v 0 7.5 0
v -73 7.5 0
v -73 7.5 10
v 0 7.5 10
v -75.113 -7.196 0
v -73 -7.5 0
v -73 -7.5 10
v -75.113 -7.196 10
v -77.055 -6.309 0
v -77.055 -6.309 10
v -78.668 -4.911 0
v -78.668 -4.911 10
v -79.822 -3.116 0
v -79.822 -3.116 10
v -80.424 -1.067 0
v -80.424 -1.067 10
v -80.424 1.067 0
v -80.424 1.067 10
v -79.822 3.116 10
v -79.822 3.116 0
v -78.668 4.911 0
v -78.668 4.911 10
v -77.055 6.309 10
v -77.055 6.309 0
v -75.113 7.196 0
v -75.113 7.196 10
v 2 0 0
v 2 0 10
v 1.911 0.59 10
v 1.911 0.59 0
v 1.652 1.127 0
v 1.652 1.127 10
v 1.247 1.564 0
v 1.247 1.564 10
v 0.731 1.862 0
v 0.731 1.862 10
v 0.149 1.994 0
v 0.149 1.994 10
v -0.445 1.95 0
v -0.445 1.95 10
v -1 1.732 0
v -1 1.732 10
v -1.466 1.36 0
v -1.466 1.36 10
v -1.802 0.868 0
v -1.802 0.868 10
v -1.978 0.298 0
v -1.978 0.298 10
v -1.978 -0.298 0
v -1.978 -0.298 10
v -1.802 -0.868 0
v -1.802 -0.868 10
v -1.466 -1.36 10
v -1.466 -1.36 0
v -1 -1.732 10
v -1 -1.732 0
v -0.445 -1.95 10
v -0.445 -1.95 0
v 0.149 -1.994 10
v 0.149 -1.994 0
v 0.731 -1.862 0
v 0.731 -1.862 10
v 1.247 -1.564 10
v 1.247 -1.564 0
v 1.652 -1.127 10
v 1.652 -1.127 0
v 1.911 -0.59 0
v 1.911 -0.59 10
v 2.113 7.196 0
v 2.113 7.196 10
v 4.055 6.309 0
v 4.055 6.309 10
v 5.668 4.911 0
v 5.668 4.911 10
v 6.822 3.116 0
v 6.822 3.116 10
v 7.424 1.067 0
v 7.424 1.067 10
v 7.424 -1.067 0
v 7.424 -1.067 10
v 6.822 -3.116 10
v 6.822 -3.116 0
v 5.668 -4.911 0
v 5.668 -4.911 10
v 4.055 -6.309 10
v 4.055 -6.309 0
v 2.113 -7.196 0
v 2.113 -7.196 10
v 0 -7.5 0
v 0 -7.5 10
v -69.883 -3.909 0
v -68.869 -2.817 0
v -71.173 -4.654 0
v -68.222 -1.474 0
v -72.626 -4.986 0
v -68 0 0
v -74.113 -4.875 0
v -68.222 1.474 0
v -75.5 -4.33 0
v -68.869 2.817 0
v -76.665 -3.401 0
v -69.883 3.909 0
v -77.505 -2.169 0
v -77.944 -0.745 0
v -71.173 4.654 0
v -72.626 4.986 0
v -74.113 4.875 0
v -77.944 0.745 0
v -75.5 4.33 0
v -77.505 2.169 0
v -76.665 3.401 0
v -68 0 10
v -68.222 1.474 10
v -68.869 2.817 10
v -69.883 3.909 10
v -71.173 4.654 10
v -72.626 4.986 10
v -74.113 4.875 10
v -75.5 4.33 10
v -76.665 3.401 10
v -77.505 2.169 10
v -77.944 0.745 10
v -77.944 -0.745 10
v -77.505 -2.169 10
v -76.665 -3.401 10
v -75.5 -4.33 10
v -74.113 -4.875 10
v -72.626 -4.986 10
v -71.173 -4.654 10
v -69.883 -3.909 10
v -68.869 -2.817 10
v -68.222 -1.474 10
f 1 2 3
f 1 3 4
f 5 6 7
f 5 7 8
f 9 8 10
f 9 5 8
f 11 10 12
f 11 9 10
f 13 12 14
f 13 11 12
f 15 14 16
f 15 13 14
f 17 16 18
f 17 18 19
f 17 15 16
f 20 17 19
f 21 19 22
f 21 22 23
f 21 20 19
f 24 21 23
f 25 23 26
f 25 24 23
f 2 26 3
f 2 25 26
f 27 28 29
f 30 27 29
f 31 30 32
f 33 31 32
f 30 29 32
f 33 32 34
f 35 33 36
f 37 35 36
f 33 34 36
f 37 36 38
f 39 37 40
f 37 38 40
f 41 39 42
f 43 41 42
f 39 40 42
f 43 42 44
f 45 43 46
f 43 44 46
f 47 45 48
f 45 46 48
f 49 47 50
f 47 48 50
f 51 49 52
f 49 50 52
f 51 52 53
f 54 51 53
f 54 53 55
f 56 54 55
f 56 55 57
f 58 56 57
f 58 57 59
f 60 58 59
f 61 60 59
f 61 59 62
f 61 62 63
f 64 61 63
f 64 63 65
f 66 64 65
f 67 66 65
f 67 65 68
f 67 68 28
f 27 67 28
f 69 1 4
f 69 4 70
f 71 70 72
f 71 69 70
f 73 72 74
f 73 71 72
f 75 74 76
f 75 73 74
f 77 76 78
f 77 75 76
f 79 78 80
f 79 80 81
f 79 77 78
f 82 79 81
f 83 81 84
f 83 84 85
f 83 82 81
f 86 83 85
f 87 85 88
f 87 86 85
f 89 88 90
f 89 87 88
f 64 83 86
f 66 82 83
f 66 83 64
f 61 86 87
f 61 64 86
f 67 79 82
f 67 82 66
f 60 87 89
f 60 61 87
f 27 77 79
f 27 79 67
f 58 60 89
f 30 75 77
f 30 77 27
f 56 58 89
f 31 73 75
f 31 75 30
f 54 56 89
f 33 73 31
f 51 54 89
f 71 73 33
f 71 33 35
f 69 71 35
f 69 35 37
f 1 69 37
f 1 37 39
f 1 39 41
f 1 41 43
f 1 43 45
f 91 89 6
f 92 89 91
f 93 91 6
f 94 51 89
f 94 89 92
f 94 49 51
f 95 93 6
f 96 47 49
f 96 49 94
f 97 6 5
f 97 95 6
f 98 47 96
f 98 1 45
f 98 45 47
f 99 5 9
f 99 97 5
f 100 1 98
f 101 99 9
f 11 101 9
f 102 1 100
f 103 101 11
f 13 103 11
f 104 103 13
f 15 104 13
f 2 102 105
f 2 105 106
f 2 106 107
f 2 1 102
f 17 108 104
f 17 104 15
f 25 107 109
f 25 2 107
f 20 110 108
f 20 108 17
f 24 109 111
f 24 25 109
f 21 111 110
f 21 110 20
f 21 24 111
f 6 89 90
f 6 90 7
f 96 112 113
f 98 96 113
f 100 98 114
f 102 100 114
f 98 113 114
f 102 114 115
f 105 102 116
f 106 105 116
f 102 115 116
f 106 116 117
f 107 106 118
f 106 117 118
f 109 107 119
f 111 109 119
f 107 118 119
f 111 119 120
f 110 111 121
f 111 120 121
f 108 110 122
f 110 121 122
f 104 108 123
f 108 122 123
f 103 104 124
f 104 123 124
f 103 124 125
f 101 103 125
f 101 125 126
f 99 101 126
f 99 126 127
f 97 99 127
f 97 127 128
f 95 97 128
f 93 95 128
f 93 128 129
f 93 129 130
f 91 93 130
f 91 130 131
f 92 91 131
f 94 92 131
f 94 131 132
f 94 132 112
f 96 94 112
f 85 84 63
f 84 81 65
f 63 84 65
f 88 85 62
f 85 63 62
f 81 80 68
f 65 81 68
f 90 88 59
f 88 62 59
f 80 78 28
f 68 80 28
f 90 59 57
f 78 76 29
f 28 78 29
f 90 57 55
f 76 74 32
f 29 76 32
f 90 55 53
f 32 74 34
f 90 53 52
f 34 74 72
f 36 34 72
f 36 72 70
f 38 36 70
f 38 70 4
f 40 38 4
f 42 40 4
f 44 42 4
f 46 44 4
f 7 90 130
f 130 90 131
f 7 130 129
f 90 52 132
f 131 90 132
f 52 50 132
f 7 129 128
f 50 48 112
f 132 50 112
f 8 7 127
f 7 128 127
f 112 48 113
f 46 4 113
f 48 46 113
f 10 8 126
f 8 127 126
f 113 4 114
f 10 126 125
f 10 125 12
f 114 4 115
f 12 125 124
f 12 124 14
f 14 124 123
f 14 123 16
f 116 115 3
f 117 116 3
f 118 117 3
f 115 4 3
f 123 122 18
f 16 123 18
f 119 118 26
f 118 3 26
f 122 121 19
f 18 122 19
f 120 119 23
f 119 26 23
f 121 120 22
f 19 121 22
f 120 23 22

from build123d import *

# Parameters (mm, degrees)
BOSS_EXTRU_1_DEPTH      = 10
ESQUISSE2_R             = 5
ESQUISSE2_R_2           = 2
ENL_V_MAT_EXTRU_1_DEPTH = 82.464716289


with BuildPart() as part:
    # Esquisse1 → Boss.-Extru.1 (new body)
    with BuildSketch(Plane.XY):
        with BuildLine():
            Line((0, -7.5), (-73, -7.5))
            ThreePointArc((-73, -7.5), (-80.5, 0), (-73, 7.5))
            Line((-73, 7.5), (0, 7.5))
            ThreePointArc((0, 7.5), (7.5, 0), (0, -7.5))
        make_face()
    extrude(amount=BOSS_EXTRU_1_DEPTH)

    # Esquisse2 → Enlèv. mat.-Extru.1 (cut, through all)
    with BuildSketch(Plane.XY.offset(10)):
        with Locations((-73, 0)):
            Circle(ESQUISSE2_R)
        Circle(ESQUISSE2_R_2)
    extrude(amount=-ENL_V_MAT_EXTRU_1_DEPTH, mode=Mode.SUBTRACT)


solid = part.part
